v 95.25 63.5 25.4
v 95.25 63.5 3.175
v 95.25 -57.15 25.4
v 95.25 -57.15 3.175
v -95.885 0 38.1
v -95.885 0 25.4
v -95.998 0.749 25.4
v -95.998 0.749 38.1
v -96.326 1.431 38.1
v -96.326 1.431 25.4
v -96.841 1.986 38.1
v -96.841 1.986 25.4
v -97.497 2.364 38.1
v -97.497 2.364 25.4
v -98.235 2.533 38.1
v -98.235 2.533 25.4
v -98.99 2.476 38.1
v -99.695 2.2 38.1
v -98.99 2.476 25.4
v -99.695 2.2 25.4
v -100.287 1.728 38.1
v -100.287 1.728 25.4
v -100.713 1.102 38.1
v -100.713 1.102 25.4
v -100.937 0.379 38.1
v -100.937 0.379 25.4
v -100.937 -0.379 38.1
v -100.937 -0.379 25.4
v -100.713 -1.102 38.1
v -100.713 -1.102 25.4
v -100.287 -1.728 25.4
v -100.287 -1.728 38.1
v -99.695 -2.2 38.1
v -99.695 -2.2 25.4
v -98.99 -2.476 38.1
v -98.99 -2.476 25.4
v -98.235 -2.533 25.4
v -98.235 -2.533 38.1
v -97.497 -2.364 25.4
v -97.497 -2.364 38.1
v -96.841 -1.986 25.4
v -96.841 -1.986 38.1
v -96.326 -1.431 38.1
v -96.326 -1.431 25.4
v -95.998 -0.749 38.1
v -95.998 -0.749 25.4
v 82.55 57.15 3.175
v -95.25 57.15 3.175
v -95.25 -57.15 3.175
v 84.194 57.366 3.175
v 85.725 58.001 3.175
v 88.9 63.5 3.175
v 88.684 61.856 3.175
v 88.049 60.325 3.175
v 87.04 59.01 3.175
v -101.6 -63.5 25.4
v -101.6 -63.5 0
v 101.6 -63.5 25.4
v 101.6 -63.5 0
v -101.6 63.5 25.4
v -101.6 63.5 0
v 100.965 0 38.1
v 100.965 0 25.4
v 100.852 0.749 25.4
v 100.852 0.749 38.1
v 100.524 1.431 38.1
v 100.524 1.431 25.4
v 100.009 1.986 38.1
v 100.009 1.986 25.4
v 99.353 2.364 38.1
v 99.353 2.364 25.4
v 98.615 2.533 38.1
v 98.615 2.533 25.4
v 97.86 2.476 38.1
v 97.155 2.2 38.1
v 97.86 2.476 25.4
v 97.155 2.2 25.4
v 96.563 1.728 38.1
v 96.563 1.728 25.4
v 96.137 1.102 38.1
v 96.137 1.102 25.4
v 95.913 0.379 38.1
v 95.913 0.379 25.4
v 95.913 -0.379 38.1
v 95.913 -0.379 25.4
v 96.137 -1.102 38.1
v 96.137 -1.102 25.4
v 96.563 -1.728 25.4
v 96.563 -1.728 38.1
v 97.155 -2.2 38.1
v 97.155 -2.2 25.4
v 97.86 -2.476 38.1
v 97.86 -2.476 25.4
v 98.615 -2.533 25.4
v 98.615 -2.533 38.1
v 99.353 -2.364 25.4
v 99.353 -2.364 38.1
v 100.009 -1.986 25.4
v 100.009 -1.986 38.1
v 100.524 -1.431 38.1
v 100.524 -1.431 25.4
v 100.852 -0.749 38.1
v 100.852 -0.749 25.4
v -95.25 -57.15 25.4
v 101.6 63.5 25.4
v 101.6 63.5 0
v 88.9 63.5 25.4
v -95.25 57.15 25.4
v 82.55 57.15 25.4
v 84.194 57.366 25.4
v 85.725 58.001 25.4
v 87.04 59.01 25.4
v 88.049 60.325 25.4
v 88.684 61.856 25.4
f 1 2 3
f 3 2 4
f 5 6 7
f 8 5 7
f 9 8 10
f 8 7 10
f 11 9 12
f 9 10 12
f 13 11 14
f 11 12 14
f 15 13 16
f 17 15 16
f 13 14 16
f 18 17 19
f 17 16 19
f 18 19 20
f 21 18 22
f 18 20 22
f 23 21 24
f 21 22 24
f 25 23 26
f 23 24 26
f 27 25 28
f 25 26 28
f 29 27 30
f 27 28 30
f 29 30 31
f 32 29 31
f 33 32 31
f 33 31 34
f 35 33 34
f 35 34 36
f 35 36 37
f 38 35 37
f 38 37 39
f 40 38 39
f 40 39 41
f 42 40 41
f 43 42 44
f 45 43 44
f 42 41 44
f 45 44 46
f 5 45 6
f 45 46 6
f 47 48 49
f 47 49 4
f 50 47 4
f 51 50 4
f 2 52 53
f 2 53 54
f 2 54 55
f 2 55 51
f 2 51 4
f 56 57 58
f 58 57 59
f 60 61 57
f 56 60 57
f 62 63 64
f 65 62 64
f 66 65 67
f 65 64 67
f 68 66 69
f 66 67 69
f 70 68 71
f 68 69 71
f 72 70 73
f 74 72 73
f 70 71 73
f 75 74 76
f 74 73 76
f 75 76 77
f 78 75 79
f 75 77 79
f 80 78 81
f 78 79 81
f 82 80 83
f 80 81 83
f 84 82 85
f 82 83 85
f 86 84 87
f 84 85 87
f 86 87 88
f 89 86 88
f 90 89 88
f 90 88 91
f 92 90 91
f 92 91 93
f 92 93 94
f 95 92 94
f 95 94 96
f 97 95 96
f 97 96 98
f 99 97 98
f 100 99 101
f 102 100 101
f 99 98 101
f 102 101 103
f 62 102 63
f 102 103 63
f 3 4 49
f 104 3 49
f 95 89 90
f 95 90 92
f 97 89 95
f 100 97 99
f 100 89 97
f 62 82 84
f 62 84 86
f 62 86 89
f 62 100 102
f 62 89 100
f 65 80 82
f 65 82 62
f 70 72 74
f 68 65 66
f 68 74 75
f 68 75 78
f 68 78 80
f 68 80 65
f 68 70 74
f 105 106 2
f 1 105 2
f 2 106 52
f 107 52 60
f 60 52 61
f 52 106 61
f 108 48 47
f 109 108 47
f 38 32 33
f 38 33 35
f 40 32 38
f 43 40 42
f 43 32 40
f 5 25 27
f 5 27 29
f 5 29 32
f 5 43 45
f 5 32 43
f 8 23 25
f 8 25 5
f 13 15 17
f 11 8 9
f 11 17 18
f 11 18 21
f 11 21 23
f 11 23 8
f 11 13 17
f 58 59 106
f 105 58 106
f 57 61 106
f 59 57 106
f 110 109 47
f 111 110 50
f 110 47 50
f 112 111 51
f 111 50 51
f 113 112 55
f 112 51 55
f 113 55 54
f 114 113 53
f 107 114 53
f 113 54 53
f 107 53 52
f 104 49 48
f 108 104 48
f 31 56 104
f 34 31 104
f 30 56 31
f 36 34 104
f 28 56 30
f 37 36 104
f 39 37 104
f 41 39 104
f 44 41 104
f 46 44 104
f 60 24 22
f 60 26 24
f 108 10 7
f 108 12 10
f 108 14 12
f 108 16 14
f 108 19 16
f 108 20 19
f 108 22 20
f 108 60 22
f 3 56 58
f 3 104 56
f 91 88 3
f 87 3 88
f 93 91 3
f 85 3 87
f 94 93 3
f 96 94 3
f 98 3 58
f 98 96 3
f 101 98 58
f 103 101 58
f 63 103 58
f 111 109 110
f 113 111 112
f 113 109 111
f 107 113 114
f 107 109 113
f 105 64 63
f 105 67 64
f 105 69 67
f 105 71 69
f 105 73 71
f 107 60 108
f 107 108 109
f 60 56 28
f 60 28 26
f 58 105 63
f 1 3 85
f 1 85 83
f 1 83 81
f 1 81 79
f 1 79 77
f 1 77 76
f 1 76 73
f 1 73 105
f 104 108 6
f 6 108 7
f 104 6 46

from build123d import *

# Parameters (mm, degrees)
F1_DEPTH = 25.4
F2_DEPTH = 3.175
F3_R     = 2.54
F4_DEPTH = 12.7


with BuildPart() as f1:
    # F0 (on Top) → F1 (new body)
    with BuildSketch(Plane.XY):
        with BuildLine():
            Line((88.9, 63.5), (-101.6, 63.5))
            Line((-101.6, 63.5), (-101.6, -63.5))
            Line((-101.6, -63.5), (101.6, -63.5))
            Line((101.6, -63.5), (101.6, 63.5))
            Line((101.6, 63.5), (95.25, 63.5))
            Line((95.25, 63.5), (95.25, 57.15))
            Line((95.25, 57.15), (95.25, -57.15))
            Line((95.25, -57.15), (-95.25, -57.15))
            Line((-95.25, -57.15), (-95.25, 57.15))
            Line((-95.25, 57.15), (82.55, 57.15))
            ThreePointArc((82.55, 57.15), (87.040128, 59.009872), (88.9, 63.5))
        make_face()
    extrude(amount=F1_DEPTH)

    # F0 (on Top) → F2 (join)
    with BuildSketch(Plane.XY):
        with BuildLine():
            Line((95.25, 63.5), (88.9, 63.5))
            ThreePointArc((88.9, 63.5), (87.040128, 59.009872), (82.55, 57.15))
            Line((82.55, 57.15), (-95.25, 57.15))
            Line((-95.25, 57.15), (-95.25, -57.15))
            Line((-95.25, -57.15), (95.25, -57.15))
            Line((95.25, -57.15), (95.25, 57.15))
            Line((95.25, 57.15), (95.25, 63.5))
        make_face()
    extrude(amount=F2_DEPTH)

    # F3 (on face) → F4 (join)
    with BuildSketch(Plane.XY.offset(25.4)):
        with Locations((-98.425, 0)):
            Circle(F3_R)
        with Locations((98.425, 0)):
            Circle(F3_R)
    extrude(amount=F4_DEPTH)


solid = f1.part
